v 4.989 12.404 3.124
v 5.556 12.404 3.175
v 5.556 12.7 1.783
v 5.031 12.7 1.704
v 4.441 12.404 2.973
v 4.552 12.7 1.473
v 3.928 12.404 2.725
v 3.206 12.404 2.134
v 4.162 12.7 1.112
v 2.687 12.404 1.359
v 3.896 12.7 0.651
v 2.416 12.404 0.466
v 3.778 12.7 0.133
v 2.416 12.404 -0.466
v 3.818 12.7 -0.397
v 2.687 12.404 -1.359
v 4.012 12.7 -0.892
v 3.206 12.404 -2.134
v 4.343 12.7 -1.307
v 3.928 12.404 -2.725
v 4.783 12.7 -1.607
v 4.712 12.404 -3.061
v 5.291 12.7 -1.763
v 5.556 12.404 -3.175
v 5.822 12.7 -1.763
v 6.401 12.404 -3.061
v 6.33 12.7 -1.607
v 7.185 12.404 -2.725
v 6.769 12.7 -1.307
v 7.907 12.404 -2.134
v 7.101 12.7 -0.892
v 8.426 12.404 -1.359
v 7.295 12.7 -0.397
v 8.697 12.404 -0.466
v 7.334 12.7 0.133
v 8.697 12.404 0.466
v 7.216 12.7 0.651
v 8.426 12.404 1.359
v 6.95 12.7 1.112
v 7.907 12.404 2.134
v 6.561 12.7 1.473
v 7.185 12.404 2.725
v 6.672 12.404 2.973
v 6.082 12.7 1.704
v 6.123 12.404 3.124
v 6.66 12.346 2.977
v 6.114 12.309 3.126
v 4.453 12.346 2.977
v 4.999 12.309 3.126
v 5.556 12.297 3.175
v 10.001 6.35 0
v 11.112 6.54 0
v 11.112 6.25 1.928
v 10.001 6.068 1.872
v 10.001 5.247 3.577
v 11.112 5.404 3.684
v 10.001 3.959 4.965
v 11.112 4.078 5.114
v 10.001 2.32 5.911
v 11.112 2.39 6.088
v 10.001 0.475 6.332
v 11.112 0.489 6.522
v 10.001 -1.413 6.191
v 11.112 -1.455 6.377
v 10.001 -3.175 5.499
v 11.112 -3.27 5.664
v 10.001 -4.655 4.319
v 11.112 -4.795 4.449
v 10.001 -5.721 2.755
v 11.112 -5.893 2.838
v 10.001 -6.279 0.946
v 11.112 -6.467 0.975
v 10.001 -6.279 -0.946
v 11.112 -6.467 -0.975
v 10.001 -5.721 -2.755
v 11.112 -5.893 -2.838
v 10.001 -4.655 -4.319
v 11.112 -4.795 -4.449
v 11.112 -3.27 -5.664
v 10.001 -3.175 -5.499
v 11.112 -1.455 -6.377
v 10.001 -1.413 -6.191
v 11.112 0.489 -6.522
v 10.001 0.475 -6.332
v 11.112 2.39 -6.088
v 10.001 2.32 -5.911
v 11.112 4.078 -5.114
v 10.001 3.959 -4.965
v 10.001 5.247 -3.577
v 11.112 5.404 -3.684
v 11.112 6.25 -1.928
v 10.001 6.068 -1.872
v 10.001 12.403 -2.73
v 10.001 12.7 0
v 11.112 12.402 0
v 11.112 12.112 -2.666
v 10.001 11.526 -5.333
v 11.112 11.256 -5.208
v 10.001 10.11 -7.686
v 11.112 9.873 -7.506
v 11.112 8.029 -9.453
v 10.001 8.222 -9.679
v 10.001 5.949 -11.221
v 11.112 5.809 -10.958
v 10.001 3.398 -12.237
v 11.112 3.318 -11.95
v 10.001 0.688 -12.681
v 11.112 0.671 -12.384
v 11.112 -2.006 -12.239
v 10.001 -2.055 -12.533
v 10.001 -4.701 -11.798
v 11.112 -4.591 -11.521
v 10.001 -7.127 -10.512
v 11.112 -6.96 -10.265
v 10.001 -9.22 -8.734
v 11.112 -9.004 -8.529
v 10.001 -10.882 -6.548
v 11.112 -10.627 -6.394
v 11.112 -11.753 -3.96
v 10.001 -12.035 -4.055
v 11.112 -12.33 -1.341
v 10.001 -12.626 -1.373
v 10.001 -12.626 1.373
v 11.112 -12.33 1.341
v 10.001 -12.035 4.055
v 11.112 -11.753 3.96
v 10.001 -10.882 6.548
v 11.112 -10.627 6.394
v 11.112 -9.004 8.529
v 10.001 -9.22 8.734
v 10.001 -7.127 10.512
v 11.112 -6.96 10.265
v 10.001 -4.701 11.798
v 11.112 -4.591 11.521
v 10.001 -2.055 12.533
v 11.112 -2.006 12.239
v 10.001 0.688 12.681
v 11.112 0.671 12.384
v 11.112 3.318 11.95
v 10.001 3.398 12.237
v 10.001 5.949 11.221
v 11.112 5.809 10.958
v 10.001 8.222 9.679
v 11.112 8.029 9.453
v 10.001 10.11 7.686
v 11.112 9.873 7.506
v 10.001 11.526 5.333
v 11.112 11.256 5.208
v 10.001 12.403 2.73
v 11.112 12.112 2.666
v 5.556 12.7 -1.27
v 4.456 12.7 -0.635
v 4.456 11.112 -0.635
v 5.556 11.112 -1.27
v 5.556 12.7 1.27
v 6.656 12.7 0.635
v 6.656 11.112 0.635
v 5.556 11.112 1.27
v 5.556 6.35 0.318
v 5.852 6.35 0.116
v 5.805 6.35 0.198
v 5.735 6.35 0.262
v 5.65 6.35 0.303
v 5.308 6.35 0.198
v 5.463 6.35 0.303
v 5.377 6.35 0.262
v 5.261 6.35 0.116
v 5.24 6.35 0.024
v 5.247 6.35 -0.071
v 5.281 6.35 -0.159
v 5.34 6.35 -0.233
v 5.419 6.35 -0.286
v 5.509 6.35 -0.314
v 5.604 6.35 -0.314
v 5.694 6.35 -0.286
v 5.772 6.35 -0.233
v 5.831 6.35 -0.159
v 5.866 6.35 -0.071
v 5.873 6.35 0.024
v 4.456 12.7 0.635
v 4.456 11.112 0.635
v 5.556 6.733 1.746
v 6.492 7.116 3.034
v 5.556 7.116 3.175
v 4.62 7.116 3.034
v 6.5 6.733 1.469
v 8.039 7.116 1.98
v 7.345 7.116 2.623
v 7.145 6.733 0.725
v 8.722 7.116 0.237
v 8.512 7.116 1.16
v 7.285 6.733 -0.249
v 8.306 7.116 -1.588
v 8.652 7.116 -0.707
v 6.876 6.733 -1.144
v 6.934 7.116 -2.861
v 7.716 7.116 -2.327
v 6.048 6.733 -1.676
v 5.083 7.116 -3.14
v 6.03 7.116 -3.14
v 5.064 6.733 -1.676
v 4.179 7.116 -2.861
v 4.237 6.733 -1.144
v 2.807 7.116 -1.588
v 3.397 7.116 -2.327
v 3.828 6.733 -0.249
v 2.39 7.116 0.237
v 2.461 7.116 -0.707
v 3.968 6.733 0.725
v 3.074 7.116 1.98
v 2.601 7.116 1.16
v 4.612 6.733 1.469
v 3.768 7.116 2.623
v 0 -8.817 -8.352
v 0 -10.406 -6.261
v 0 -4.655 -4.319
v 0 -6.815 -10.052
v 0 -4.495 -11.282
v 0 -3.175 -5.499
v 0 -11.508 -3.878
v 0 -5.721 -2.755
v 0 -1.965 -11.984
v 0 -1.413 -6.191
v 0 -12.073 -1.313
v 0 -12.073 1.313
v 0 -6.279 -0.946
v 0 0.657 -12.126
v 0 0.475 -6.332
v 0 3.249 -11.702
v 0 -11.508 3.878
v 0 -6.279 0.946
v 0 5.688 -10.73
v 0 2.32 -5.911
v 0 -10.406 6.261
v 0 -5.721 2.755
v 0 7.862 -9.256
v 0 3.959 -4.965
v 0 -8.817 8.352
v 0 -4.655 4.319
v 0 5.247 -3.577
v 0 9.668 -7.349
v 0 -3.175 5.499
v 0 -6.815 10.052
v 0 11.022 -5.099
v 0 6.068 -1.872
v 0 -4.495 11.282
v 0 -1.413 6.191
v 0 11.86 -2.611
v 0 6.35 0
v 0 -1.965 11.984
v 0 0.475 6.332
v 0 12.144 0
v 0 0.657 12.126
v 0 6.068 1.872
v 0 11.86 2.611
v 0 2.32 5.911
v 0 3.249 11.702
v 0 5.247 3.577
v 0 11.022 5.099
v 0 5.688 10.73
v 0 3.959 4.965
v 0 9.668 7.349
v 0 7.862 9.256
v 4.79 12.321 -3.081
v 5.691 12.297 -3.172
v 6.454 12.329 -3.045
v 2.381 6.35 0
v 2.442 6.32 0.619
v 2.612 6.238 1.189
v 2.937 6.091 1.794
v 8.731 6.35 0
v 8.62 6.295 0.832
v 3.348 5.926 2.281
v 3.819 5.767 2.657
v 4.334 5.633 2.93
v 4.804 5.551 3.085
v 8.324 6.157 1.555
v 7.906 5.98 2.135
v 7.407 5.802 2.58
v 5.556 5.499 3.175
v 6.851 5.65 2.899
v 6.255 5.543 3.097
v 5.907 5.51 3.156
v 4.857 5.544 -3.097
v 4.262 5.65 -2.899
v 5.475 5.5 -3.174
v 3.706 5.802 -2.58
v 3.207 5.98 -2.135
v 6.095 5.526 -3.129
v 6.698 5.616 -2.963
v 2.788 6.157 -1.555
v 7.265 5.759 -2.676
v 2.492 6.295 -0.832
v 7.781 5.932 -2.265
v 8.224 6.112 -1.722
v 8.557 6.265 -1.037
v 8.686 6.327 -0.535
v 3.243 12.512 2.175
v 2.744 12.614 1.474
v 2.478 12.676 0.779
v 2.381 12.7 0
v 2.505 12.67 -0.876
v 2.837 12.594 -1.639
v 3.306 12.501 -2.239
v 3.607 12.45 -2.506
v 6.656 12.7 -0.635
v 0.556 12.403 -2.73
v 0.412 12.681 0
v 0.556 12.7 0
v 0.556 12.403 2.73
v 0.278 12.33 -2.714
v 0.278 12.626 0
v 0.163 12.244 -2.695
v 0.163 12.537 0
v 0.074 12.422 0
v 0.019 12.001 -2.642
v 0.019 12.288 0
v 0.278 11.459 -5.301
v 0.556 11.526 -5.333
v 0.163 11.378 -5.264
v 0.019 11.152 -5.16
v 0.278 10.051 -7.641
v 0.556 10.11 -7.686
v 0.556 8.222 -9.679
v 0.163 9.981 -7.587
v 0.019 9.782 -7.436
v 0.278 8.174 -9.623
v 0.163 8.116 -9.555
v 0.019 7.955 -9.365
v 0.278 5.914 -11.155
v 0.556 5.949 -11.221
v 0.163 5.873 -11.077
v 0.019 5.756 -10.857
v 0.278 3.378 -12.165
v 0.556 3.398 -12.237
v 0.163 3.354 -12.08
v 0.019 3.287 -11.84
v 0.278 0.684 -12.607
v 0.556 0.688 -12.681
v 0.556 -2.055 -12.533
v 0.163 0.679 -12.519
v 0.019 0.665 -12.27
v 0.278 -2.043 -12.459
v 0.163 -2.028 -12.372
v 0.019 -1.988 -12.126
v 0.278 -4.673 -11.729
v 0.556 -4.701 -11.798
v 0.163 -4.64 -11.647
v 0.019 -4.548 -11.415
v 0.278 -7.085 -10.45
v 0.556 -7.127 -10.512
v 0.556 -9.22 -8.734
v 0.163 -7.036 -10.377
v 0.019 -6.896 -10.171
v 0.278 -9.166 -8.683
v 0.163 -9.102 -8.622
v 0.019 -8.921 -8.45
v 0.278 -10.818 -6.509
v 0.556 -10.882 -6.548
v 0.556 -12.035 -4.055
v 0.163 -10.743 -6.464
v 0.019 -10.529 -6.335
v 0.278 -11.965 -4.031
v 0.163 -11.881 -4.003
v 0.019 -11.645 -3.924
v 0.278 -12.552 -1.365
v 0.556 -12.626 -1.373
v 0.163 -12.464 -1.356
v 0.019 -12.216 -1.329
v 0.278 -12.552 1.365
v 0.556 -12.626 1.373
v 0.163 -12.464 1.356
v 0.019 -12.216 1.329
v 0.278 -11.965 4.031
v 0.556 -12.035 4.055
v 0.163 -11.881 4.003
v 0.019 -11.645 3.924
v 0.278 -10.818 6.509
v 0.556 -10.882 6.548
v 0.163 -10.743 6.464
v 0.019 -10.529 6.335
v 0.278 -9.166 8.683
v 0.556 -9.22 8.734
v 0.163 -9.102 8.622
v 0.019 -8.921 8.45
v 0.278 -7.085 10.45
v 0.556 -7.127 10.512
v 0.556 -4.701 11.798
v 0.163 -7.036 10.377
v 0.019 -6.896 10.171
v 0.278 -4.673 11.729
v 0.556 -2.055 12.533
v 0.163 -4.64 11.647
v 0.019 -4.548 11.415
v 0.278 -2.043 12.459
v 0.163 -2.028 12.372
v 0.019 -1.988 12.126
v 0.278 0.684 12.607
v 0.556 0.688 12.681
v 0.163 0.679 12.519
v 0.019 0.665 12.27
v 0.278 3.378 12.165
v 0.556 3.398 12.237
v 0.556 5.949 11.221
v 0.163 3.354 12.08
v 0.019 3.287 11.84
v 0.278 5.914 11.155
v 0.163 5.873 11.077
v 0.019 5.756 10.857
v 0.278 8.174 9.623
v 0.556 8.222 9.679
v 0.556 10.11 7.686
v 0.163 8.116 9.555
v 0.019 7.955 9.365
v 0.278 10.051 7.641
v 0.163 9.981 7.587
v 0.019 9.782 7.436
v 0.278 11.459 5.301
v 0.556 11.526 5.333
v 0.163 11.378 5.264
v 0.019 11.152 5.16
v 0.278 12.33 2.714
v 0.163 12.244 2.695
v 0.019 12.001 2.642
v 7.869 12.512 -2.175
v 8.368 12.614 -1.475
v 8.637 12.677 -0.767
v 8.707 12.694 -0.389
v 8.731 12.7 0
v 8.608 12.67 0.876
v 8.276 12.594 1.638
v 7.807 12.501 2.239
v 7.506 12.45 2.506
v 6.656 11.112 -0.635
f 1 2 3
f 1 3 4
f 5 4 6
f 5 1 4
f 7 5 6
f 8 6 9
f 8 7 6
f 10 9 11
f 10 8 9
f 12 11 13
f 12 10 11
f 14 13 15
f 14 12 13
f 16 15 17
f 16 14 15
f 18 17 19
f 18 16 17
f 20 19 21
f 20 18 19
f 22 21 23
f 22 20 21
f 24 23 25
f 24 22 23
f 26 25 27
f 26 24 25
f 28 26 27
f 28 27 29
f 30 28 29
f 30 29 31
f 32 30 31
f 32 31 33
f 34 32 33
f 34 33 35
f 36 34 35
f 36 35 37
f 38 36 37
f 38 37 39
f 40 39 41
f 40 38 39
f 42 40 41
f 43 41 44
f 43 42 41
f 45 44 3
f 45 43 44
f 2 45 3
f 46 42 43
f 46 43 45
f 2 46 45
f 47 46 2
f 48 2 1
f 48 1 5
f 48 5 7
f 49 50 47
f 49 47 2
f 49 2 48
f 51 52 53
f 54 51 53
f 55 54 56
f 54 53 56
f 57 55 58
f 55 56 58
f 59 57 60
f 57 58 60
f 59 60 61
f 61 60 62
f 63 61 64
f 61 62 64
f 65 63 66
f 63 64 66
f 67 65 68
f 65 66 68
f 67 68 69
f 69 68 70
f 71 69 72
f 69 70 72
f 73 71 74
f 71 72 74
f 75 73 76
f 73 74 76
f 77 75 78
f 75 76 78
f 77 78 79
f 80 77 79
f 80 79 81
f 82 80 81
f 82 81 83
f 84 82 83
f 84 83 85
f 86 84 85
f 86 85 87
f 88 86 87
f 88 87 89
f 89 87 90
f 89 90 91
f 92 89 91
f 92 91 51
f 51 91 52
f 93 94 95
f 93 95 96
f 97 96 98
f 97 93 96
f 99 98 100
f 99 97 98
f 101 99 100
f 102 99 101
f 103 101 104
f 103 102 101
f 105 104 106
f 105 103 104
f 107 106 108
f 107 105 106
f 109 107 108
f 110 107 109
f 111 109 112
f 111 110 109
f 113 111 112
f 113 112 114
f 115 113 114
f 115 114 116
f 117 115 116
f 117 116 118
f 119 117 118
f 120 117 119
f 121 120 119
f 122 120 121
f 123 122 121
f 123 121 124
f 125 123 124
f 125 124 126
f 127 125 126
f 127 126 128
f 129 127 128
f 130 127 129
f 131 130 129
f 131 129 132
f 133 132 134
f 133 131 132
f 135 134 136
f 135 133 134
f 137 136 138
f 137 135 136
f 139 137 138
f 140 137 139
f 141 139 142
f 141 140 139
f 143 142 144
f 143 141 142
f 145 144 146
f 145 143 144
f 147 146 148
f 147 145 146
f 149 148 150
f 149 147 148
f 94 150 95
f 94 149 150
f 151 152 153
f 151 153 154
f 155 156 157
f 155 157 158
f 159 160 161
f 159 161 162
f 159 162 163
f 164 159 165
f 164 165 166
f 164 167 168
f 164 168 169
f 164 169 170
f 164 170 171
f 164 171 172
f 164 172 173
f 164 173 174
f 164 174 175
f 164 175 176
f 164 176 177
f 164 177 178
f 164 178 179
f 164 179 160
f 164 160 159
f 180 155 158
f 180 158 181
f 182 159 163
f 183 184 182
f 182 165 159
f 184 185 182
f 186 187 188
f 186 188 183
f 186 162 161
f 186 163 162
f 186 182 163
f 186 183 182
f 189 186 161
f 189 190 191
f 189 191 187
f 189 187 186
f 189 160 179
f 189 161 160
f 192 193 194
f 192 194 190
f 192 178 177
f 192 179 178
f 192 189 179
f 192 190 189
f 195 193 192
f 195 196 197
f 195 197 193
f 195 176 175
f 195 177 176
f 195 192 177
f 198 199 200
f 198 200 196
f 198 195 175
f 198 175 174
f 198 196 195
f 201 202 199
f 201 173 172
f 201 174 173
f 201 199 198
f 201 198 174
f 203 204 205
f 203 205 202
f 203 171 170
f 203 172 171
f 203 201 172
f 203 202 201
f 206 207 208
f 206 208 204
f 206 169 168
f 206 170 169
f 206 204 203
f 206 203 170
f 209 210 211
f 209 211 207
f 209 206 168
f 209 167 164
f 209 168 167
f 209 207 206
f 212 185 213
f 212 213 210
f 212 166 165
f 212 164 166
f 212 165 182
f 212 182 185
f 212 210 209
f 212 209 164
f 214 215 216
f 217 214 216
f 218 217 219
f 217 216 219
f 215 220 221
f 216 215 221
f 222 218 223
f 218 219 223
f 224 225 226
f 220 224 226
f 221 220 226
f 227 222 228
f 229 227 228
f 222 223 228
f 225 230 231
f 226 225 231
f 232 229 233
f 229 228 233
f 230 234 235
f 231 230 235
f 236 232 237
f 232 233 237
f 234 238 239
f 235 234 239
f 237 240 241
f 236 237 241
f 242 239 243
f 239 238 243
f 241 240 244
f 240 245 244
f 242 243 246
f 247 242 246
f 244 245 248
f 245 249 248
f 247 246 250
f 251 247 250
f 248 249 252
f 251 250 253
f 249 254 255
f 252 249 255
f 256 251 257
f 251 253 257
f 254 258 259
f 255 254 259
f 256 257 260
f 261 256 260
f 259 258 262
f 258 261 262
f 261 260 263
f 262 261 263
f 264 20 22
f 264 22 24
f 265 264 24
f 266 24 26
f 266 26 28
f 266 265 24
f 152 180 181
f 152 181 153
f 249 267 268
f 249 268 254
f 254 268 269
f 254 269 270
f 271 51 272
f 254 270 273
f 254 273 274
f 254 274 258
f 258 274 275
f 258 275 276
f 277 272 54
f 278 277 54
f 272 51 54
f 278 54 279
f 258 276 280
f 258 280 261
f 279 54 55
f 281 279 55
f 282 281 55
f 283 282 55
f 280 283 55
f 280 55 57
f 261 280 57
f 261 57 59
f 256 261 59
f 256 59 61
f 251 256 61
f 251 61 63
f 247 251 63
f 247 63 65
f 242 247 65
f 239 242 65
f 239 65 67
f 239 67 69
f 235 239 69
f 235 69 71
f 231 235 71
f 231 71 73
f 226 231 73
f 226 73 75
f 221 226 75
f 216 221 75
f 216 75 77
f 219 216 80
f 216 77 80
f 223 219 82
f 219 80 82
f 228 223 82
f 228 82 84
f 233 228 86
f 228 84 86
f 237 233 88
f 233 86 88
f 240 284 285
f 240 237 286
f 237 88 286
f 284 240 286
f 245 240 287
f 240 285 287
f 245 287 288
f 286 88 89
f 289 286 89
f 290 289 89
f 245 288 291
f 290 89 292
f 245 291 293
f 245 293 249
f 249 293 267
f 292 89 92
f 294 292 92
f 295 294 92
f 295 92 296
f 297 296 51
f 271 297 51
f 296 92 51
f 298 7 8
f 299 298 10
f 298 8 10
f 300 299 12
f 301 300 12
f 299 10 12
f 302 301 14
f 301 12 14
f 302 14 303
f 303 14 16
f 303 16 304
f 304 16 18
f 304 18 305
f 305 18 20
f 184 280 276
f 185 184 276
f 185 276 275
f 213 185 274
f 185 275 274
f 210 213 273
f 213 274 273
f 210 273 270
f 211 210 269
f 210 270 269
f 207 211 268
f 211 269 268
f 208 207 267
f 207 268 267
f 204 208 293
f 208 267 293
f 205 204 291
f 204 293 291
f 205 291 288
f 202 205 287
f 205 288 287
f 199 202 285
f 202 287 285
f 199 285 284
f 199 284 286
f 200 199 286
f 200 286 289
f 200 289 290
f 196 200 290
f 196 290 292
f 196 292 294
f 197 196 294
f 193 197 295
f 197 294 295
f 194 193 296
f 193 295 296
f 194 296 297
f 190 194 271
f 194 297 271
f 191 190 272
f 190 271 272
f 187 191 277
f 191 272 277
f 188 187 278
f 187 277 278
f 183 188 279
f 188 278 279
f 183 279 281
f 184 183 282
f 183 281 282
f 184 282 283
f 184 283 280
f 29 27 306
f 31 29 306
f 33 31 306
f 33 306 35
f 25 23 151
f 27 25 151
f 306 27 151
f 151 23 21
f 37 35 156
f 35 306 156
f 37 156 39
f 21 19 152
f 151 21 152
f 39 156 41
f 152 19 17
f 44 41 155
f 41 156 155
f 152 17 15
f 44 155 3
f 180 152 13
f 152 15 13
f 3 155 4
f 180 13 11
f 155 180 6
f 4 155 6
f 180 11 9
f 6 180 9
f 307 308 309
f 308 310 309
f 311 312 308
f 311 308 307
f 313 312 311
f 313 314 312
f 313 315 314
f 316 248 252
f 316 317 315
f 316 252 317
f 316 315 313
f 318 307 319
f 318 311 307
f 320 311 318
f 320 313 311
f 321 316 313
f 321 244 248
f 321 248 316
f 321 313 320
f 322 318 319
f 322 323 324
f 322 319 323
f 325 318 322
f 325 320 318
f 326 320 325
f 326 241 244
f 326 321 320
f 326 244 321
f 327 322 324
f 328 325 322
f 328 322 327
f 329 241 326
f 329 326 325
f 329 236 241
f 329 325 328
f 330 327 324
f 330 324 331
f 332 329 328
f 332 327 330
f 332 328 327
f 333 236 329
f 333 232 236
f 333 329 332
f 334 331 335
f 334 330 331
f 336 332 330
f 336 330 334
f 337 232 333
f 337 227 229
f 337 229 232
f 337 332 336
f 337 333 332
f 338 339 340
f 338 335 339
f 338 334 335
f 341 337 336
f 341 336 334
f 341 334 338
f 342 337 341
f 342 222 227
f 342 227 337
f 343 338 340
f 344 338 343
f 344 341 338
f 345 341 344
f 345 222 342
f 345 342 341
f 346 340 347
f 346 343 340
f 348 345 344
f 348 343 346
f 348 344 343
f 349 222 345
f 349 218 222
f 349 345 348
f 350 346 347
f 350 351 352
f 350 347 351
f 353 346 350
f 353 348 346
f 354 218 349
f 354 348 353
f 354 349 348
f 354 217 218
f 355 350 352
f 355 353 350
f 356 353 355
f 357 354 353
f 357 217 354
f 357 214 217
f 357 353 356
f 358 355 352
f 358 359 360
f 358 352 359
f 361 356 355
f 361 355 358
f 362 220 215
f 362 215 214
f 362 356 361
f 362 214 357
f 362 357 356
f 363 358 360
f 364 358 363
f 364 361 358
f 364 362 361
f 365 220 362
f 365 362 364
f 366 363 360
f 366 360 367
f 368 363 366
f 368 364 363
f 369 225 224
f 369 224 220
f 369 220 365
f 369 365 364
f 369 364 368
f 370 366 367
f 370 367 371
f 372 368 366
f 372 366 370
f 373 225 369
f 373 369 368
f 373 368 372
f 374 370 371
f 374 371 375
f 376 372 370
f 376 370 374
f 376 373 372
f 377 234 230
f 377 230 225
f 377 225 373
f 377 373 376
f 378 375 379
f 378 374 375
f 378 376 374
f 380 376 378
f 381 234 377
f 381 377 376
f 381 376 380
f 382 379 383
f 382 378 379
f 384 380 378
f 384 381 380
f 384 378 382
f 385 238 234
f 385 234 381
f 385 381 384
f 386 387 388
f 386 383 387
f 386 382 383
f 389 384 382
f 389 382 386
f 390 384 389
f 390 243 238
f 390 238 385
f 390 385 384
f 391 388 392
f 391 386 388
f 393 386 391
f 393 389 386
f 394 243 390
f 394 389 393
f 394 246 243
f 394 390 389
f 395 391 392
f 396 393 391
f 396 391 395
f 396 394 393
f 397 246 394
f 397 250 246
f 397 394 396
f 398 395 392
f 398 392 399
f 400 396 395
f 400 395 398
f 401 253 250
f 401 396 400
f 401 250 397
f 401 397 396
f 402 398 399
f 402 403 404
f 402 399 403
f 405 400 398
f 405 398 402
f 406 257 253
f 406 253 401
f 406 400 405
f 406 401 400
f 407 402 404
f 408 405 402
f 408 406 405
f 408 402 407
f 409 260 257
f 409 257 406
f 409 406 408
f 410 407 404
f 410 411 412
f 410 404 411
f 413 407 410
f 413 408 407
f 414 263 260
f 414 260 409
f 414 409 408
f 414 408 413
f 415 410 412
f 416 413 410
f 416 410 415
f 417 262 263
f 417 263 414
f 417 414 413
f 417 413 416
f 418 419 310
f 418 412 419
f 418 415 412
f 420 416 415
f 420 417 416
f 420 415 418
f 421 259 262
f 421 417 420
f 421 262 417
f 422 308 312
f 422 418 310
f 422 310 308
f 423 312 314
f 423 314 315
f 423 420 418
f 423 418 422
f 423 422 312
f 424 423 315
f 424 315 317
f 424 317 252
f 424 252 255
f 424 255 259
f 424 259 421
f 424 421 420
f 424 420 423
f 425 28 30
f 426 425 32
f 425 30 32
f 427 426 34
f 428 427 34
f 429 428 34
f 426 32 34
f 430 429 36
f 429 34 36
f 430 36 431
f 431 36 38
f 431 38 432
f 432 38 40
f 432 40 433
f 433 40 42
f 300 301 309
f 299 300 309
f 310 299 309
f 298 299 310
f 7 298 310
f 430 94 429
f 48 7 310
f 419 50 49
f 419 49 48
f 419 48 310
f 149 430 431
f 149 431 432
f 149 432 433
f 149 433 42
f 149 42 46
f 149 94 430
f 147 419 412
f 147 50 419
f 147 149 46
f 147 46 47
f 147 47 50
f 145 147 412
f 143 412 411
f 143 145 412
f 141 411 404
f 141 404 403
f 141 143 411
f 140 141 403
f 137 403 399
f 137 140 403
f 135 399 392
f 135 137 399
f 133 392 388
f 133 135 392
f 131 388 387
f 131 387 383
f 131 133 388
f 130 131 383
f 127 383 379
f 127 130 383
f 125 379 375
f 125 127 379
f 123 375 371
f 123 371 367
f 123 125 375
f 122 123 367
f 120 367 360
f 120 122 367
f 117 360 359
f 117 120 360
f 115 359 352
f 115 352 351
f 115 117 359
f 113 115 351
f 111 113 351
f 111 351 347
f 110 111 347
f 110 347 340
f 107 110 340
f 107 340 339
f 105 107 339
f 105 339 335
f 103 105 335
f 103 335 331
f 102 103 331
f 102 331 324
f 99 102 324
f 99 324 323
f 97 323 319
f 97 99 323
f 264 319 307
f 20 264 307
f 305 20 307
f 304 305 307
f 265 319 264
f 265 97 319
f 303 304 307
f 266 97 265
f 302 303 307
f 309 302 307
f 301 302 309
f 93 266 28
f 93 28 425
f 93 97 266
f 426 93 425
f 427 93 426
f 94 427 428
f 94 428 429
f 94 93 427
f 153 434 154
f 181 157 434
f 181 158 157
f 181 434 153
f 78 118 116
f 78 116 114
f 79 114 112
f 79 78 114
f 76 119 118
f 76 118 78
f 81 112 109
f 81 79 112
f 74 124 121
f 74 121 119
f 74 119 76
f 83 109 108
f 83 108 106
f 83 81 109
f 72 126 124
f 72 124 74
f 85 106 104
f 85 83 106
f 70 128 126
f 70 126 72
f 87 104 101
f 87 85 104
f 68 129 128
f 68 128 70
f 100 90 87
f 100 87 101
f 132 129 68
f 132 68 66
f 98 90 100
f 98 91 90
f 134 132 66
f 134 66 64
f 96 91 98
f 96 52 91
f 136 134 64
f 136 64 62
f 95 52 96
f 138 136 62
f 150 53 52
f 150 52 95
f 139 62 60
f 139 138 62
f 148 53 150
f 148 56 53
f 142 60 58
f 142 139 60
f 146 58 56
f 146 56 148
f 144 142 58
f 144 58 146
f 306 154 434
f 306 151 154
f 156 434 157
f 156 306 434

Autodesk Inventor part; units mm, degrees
ref_plane "YZ Plane" through (0, 0, 0) normal (1, 0, 0) x (0, 1, 0)
sketch "Boceto1" plane through (0, 0, 0) normal (0, 0, 1) x (1, 0, 0)
  line L0 (0, 12.7) -> (11.1125, 12.7)
  line L1 (-1.9497, 0) -> (21.5466, 0)
  line L2 (0, 12.7) -> (0, 6.35)
  line L3 (0, 6.35) -> (11.1125, 6.35)
  line L4 (11.1125, 6.35) -> (11.1125, 12.7)
  line L5 (-6.6489, 0) -> (26.2458, 0) projected
  line L6 (0, 54) -> (0, -9) projected
  dimension "d0" = 25.4
  dimension "d1" = 12.7
  dimension "d2" = 11.1125
revolve "Cuerpo" add sketch "Boceto1" angle 360 about axis through (-1.9497, 0, 0) along (1, 0, 0)
ref_plane "IDS_WORKPLANE{1}" through (0, 12.7, 0) normal (0, 1, 0) x (-1, 0, 0)
sketch "Boceto2" plane through (0, 12.7, 0) normal (0, 1, 0) x (-1, 0, 0)
  line L0 (0, 12.7) -> (0, -12.7) projected
  line L1 (-12.156, 0) -> (2.026, 0) projected
  point P0 (-5.5563, 0)
  dimension "d7" = 5.5563
hole "Agujero1" at (5.5563, 12.7, 0) direction (0, -1, 0) diameter 6.35 depth 12.7 tip angle 118
ref_plane "IDS_WORKPLANE{2}" through (5.5563, 0, 0) normal (-1, 0, 0) x (0, 0, 1)
sketch "Boceto3" plane through (5.5563, 0, 0) normal (-1, 0, 0) x (0, 0, 1)
  line L0 (0, 12.7) -> (1.7831, 12.7)
  line L1 (1.7831, 12.7) -> (3.175, 12.4041)
  line L2 (3.175, 12.4041) -> (3.175, 7.1157)
  line L3 (0, 56.54) -> (0, -24.24) projected
  circle A0 centre (0, 0) radius 12.7 projected
  line L4 (0, 12.7) -> (0, 6.35)
  line L5 (3.175, 7.1157) -> (0.3175, 6.35)
  line L6 (0.3175, 6.35) -> (0, 6.35)
  dimension "d18" = 3.5662
  dimension "d19" = 6.35
  dimension "d20" = 0.635
  dimension "d21" = 6.35
  dimension "d30" = 15
  dimension "d31" = 12
revolve "Tornillo de cabeza perdida1" add sketch "Boceto3" angle 360 about axis through (5.5563, 12.7, 0) along (0, -1, 0) picked at (1.5203, 8.7069) contours A0 L2 L5 L6 L3 | L0 L1 L2 A0
sketch "Boceto4" plane through (0, 12.7, 0) normal (0, 1, 0) x (-1, 0, 0)
  line L0 (-5.5562, 1.27) -> (-4.4564, 0.635)
  line L1 (-4.4564, 0.635) -> (-4.4564, -0.635)
  line L2 (-4.4564, -0.635) -> (-5.5563, -1.27)
  line L3 (-5.5563, -1.27) -> (-6.6561, -0.635)
  line L4 (-6.6561, -0.635) -> (-6.6561, 0.635)
  line L5 (-6.6561, 0.635) -> (-5.5562, 1.27)
  line L6 (-14.2345, 0) -> (2.3724, 0) projected
  line L7 (0, 6.35) -> (0, -6.35) projected
  point P0 (-5.5563, 0)
  dimension "d22" = 2.54
  dimension "d23" = 5.5563
extrude "Ranura1" cut sketch "Boceto4" against normal blind 1.5875
chamfer "Chaflán1" distance 1.1112 angle 15 1 edges at (11.1125, -12.7, 0) measured on face at (3.7042, 10.7339, 6.7877)
chamfer "Chaflán2" distance 0.1905 distance2 1.1112 1 edges at (11.1125, -6.35, 0) measured on face at (11.1125, 10.2032, -1.4959)
fillet "Empalme1" radius 0.5558 1 edges at (0, -12.7, 0)
equation "\"d7\" = 0.5 * SD"
equation "\"d18\" = GD1"
equation "\"d19\" = NND"
equation "\"d20\" = 0.1 * NND"
equation "\"d21\" = -0.5 * WND + 0.5 * SD2"
equation "\"d30\" = FAWI"
equation "\"d31\" = 0.8 * FAWI"
equation "\"d22\" = 0.4 * NND"
equation "\"d23\" = 0.5 * SD"
equation "\"d24\" = 0.25 * NND"
equation "\"d8\" = NND"
equation "\"d13\" = 0.5 * SD2"
equation "\"d4\" = PHH"
equation "\"d5\" = FAWI"
equation "\"d59\" = PHH"
equation "\"d26\" = -0.5 * WND + 0.5 * NND1"
equation "\"d27\" = PHH"
equation "\"d29\" = RR"
equation "\"d0\" = SD2"
equation "\"d1\" = WND"
equation "\"d2\" = SD"
equation "\"WND\" = 12.7"
equation "\"SD2\" = 25.4"
equation "\"SD\" = 11.1125"
equation "\"NND\" = 6.35"
equation "\"FAWI\" = 15deg"
equation "\"PHH\" = 1.11125"
equation "\"d6\" = 0.5 * SD2"
equation "\"GD1\" = 3.56616"
equation "\"d17\" = -0.5 * SD"
equation "\"RR\" = 0.55575"
equation "\"NND1\" = 13.081"
properties part number "Unbrako. Hallowell Steel Collars. Inch Series - 0.5 x 1 x 7/16" material "Acero, suave"
